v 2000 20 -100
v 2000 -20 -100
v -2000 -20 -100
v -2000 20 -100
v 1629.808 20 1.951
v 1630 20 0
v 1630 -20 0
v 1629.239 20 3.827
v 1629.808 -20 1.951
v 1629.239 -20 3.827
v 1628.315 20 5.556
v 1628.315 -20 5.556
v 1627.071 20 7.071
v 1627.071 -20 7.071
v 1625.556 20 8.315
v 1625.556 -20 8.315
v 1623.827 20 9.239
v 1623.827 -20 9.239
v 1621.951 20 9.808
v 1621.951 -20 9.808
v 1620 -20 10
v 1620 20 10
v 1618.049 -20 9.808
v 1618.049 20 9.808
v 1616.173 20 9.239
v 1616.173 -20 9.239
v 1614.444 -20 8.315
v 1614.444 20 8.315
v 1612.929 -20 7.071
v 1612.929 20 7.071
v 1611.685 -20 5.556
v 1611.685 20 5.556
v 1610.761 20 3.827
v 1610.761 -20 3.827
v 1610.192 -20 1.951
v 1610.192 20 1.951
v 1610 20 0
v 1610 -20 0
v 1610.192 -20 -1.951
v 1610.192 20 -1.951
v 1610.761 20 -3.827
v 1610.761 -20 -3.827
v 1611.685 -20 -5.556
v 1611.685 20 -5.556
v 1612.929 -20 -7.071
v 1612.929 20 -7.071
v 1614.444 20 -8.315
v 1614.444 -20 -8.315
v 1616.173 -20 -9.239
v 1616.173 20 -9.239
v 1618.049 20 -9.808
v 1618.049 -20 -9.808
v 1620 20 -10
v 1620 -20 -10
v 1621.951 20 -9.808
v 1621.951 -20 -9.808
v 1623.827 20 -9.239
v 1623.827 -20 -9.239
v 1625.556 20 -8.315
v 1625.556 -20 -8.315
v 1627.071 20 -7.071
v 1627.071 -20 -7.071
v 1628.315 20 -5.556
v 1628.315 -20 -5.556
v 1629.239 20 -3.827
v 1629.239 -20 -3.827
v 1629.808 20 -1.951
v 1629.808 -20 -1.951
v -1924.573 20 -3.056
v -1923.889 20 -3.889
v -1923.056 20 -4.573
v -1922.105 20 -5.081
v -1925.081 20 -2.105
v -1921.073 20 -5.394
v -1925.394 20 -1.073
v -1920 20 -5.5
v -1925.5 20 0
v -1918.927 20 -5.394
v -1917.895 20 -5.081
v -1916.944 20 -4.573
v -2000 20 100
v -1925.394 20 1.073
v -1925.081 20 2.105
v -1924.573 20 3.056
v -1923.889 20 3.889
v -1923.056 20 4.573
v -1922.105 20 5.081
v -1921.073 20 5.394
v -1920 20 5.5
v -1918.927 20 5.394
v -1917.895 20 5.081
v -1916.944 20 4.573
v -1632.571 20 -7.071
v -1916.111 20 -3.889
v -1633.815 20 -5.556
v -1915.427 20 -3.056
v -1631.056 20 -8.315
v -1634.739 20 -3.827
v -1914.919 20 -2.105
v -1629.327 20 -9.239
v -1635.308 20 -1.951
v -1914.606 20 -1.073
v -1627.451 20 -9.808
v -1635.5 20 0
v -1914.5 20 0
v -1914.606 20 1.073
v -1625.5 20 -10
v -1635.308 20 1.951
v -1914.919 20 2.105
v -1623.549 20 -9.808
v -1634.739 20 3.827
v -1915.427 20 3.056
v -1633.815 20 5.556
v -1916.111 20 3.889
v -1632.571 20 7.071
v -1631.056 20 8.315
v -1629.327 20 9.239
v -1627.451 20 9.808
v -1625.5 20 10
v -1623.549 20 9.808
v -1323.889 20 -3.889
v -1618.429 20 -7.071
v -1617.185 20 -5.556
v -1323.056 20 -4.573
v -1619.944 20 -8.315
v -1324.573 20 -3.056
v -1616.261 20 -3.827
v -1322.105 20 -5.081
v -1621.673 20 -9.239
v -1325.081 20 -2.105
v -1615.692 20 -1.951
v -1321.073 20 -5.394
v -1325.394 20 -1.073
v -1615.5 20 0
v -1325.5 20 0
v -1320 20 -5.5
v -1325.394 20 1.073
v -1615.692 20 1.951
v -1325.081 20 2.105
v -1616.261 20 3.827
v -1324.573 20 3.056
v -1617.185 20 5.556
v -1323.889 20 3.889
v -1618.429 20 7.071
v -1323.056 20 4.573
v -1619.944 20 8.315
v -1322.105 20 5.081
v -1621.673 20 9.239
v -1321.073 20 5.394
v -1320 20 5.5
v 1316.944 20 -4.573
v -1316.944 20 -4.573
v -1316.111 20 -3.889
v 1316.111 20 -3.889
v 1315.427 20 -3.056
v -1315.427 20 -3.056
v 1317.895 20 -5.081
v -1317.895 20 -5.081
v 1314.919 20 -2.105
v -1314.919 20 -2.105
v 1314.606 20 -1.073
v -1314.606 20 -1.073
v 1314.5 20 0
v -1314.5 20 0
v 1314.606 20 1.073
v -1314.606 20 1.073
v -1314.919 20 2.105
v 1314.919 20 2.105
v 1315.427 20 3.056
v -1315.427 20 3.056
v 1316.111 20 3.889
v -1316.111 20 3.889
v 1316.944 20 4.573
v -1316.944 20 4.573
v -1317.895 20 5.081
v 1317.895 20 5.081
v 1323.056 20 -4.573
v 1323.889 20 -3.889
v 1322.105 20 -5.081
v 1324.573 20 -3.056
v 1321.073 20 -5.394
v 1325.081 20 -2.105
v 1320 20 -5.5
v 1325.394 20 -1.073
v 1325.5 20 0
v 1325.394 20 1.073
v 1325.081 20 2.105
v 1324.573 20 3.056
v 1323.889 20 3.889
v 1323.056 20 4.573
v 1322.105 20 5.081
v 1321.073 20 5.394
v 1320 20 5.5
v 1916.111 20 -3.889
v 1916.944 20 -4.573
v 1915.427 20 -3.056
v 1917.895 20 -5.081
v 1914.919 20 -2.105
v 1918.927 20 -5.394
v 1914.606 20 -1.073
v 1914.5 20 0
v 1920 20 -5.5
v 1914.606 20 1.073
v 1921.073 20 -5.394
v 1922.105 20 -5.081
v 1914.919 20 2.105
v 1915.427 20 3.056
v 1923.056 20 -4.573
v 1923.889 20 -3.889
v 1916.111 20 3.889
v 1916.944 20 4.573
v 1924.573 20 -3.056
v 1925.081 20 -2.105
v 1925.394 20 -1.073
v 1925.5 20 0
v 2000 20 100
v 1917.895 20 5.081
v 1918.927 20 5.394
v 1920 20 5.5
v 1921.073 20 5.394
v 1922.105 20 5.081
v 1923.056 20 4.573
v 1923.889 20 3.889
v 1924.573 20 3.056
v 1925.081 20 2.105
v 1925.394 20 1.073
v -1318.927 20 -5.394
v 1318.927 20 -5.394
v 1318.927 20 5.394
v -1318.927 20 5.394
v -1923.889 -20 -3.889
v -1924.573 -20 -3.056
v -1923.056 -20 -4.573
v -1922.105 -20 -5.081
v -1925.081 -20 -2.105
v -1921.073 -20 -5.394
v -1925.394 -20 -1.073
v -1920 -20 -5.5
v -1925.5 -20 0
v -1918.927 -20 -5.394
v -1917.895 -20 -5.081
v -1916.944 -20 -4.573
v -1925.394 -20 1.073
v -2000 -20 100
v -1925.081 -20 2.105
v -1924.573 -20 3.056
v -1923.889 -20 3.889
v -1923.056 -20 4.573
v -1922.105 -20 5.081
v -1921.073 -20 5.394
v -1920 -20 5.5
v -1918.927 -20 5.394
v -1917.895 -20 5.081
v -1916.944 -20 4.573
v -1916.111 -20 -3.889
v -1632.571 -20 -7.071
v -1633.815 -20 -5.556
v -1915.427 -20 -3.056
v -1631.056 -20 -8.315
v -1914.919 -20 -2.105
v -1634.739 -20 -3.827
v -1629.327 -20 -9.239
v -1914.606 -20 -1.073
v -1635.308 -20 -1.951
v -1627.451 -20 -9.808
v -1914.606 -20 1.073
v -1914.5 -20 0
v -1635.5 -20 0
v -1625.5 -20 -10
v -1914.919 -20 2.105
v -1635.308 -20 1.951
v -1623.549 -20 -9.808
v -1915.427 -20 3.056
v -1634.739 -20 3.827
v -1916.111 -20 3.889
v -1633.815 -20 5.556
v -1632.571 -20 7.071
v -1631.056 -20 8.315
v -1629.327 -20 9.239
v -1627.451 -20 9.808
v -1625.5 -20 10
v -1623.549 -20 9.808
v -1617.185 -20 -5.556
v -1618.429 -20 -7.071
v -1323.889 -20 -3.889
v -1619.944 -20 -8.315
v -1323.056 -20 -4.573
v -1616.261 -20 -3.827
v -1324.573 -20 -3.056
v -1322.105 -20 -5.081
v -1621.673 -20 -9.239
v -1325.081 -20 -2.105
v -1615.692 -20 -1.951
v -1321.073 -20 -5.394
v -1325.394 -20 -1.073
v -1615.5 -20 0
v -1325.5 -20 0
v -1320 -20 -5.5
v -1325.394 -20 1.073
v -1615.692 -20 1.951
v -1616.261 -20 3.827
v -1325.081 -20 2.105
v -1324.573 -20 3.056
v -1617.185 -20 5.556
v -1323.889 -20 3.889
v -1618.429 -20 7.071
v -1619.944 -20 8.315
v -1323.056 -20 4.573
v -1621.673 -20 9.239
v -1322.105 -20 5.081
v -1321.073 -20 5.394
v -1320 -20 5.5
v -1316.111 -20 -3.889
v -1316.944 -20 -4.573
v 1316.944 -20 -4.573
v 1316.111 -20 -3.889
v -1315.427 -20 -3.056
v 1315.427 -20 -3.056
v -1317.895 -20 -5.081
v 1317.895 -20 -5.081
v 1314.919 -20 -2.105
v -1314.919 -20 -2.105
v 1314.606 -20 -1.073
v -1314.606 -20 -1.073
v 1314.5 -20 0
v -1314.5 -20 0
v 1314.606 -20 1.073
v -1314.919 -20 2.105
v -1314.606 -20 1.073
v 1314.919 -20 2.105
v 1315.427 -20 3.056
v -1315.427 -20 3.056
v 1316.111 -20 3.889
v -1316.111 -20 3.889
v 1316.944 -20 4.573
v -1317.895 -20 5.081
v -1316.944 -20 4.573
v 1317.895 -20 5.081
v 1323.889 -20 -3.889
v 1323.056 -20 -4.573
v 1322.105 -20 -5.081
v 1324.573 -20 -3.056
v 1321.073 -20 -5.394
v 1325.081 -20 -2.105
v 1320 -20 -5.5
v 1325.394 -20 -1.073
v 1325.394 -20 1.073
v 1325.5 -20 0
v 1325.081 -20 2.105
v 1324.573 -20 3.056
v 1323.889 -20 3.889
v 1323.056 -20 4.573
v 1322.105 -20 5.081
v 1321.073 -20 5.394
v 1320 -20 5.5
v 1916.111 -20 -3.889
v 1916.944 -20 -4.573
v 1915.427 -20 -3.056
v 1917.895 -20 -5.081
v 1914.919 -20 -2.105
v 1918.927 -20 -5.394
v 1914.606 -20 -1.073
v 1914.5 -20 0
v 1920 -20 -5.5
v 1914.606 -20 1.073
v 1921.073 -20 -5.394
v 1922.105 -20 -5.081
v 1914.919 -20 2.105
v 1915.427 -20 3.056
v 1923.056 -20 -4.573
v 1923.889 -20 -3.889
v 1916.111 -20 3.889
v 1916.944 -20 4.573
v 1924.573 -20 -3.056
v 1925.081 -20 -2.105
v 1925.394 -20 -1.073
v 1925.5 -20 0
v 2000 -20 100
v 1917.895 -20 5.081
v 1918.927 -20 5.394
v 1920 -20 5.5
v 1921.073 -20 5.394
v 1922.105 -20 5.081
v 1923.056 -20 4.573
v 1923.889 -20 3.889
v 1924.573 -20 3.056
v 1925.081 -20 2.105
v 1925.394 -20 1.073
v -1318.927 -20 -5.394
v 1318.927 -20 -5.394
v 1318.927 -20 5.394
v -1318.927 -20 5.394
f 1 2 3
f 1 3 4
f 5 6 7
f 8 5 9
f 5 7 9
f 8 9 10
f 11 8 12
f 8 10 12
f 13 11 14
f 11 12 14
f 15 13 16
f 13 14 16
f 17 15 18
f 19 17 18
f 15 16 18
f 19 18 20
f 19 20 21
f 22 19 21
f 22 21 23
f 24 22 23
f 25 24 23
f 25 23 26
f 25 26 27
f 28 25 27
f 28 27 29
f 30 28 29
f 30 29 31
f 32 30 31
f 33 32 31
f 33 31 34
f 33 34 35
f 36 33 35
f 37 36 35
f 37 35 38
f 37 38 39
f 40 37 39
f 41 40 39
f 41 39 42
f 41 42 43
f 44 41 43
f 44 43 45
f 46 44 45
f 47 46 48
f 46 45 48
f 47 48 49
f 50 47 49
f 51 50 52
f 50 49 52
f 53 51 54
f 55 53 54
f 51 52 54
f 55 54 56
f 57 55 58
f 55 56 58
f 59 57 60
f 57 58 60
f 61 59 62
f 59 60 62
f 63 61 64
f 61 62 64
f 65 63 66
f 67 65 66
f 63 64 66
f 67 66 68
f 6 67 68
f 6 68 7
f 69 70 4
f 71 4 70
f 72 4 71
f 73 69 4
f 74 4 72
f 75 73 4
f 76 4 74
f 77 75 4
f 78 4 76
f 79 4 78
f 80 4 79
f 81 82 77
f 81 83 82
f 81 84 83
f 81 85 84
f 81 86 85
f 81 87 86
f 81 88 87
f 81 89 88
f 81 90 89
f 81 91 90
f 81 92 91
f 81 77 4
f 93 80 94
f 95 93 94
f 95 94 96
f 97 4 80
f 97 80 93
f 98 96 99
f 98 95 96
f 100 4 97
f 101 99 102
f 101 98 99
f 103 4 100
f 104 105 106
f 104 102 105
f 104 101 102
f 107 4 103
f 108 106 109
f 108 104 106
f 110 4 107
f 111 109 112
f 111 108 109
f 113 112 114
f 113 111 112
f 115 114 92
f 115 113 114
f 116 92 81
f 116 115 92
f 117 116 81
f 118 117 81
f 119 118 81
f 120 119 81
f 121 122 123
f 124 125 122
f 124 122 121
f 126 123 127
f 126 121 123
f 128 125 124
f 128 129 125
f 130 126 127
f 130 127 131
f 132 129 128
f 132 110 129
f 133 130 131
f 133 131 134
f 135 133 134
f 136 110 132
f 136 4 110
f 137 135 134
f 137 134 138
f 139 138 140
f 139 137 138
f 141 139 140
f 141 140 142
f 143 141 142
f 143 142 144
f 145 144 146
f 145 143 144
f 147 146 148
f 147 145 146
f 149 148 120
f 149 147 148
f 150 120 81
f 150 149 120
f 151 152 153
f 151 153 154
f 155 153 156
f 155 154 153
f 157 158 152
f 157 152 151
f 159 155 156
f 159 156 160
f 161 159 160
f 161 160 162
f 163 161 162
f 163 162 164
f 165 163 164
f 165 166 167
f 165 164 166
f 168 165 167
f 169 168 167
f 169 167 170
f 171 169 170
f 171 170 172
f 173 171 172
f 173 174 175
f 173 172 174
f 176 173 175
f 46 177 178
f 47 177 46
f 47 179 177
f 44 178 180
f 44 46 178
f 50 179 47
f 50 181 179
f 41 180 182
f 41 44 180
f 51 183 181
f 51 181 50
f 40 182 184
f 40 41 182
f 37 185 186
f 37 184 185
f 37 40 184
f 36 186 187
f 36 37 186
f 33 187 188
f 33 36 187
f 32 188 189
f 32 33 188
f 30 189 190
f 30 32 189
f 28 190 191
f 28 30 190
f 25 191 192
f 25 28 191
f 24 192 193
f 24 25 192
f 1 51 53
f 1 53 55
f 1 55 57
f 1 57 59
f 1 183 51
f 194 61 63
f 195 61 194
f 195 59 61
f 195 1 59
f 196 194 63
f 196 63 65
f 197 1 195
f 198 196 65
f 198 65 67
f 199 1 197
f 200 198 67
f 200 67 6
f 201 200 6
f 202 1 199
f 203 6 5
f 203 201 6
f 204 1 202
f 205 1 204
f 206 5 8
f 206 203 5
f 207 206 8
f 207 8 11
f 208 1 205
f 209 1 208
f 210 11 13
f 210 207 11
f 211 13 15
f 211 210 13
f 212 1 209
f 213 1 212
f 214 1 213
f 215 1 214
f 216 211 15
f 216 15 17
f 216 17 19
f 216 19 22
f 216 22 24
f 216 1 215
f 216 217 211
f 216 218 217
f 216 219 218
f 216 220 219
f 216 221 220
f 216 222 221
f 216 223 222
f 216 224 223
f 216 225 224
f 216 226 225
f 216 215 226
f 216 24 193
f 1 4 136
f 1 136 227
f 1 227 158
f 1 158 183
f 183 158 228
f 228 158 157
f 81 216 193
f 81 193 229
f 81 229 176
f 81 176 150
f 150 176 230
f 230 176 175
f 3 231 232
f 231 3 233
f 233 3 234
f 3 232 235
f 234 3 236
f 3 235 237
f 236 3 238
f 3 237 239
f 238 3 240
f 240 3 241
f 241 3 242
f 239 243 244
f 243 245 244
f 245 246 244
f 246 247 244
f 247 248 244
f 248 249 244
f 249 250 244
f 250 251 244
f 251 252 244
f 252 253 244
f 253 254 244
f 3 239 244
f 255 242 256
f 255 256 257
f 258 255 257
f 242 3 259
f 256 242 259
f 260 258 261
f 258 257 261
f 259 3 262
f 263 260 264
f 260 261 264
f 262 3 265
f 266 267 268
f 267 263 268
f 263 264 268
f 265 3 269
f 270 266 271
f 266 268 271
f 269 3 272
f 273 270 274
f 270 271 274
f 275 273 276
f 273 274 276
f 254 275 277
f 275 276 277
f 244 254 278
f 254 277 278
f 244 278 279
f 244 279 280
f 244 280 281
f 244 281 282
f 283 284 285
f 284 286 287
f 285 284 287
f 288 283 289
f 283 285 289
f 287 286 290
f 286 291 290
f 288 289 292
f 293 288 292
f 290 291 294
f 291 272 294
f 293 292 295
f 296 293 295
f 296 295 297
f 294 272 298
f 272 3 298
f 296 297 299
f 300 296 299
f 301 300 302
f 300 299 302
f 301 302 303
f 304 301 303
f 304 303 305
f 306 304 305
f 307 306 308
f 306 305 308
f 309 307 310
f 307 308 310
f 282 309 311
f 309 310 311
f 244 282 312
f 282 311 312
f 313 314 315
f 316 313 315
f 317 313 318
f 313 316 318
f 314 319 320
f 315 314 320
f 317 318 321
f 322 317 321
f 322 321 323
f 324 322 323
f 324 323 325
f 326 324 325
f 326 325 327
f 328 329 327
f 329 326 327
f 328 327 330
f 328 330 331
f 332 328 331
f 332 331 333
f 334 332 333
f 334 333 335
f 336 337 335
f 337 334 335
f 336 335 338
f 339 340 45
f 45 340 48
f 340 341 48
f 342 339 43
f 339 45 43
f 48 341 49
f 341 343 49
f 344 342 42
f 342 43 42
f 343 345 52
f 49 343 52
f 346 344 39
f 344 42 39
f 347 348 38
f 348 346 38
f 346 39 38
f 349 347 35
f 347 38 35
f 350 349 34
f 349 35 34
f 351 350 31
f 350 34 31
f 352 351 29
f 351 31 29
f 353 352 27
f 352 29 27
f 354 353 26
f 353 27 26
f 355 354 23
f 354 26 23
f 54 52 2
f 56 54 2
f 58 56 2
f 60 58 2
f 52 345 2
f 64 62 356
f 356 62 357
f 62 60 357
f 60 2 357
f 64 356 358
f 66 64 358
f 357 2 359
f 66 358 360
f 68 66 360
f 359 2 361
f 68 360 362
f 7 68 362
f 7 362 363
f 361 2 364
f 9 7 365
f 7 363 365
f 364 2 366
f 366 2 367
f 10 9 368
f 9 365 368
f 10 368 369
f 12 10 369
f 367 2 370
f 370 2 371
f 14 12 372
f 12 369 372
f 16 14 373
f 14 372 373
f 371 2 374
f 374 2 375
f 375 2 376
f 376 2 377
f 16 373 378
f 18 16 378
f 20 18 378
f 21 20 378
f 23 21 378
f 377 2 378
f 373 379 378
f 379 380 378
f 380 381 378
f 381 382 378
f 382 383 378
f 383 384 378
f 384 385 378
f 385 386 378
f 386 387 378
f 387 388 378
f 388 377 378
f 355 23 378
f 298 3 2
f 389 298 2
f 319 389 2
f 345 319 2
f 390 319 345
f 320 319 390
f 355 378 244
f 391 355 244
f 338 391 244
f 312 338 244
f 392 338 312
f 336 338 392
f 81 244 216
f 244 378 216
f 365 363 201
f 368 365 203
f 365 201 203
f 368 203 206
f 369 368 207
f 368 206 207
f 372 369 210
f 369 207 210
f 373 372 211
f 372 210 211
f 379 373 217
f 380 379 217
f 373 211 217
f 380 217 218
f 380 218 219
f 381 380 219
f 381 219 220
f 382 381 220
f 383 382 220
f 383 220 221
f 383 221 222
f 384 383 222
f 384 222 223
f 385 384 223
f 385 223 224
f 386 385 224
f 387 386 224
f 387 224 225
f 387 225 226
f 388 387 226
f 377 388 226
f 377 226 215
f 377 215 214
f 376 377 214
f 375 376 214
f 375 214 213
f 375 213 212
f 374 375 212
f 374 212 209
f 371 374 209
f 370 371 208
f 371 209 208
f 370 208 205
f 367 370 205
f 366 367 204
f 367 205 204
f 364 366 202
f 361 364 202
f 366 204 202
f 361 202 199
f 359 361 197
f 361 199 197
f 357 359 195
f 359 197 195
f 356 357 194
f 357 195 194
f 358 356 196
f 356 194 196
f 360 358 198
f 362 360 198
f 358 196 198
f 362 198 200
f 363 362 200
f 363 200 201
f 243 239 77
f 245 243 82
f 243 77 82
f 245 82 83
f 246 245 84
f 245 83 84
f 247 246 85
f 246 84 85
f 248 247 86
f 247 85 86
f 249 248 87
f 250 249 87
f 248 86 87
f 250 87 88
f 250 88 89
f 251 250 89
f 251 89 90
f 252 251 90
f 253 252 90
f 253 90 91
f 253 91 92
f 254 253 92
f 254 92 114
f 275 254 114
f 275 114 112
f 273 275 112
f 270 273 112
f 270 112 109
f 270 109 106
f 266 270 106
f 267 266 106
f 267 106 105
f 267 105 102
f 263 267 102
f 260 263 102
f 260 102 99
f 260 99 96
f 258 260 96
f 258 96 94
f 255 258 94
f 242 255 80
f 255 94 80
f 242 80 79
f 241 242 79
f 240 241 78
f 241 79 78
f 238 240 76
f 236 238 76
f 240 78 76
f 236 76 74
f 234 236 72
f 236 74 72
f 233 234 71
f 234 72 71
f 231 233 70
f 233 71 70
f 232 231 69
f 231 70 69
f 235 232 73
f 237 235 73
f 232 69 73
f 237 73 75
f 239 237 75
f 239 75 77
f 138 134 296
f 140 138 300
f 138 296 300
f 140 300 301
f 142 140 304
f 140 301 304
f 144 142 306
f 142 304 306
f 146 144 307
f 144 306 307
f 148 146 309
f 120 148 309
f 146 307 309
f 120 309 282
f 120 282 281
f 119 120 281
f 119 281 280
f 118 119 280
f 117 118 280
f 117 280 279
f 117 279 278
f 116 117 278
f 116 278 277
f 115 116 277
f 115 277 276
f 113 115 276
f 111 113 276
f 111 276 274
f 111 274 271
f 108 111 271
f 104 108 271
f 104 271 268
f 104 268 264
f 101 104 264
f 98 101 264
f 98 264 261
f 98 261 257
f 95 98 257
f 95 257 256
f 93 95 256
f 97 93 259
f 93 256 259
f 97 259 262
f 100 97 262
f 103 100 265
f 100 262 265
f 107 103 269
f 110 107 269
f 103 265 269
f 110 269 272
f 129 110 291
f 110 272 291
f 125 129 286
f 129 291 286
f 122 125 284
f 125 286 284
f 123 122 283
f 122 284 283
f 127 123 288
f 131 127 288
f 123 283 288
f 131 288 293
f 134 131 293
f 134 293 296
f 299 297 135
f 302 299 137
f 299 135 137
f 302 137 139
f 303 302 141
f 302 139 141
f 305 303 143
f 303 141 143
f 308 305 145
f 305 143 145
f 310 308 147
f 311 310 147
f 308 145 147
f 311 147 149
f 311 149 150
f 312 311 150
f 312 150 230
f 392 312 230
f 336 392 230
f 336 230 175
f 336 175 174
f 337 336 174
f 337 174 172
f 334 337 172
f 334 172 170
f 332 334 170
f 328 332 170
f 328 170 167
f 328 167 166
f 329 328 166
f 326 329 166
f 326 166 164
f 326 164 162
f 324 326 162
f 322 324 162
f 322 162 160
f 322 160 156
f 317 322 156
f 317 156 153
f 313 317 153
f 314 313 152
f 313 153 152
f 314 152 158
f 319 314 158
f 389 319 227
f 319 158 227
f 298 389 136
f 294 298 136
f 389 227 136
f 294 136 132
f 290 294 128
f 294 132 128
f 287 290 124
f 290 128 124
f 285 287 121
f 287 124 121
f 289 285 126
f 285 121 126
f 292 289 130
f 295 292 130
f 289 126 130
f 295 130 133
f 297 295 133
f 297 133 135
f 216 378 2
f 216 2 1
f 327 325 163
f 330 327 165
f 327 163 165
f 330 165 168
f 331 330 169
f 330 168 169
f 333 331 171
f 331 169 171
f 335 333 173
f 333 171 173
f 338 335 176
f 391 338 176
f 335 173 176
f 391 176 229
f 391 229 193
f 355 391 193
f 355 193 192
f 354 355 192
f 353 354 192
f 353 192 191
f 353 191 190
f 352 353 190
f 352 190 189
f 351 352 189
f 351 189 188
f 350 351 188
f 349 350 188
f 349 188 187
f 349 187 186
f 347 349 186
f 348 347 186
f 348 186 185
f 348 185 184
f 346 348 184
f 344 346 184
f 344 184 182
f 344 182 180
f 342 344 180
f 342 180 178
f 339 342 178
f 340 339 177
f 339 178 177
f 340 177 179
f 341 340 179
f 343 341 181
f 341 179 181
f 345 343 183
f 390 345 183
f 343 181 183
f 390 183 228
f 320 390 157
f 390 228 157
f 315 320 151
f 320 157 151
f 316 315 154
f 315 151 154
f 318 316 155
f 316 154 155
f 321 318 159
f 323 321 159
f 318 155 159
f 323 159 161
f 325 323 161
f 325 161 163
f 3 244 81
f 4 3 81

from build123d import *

# Parameters (mm, degrees)
F0_W     = 40
F0_H     = 200
F1_DEPTH = 2000
F3_D     = 11
F5_D     = 20


with BuildPart() as f1:
    # F0 (on Right) → F1 (new body, symmetric)
    with BuildSketch(Plane.YZ):
        Rectangle(F0_W, F0_H)
    extrude(amount=F1_DEPTH, both=True)

    # F3 (through all)
    with Locations(Plane.XZ.offset(20)):
        with Locations((-1920, 0), (-1320, 0), (1320, 0), (1920, 0)):
            Hole(F3_D / 2)

    # F5 (through all)
    with Locations(Plane(origin=(0, 20, 0), x_dir=(-1, 0, 0), z_dir=(0, 1, 0))):
        with Locations((1625.5, 0), (-1620, 0)):
            Hole(F5_D / 2)


solid = f1.part
